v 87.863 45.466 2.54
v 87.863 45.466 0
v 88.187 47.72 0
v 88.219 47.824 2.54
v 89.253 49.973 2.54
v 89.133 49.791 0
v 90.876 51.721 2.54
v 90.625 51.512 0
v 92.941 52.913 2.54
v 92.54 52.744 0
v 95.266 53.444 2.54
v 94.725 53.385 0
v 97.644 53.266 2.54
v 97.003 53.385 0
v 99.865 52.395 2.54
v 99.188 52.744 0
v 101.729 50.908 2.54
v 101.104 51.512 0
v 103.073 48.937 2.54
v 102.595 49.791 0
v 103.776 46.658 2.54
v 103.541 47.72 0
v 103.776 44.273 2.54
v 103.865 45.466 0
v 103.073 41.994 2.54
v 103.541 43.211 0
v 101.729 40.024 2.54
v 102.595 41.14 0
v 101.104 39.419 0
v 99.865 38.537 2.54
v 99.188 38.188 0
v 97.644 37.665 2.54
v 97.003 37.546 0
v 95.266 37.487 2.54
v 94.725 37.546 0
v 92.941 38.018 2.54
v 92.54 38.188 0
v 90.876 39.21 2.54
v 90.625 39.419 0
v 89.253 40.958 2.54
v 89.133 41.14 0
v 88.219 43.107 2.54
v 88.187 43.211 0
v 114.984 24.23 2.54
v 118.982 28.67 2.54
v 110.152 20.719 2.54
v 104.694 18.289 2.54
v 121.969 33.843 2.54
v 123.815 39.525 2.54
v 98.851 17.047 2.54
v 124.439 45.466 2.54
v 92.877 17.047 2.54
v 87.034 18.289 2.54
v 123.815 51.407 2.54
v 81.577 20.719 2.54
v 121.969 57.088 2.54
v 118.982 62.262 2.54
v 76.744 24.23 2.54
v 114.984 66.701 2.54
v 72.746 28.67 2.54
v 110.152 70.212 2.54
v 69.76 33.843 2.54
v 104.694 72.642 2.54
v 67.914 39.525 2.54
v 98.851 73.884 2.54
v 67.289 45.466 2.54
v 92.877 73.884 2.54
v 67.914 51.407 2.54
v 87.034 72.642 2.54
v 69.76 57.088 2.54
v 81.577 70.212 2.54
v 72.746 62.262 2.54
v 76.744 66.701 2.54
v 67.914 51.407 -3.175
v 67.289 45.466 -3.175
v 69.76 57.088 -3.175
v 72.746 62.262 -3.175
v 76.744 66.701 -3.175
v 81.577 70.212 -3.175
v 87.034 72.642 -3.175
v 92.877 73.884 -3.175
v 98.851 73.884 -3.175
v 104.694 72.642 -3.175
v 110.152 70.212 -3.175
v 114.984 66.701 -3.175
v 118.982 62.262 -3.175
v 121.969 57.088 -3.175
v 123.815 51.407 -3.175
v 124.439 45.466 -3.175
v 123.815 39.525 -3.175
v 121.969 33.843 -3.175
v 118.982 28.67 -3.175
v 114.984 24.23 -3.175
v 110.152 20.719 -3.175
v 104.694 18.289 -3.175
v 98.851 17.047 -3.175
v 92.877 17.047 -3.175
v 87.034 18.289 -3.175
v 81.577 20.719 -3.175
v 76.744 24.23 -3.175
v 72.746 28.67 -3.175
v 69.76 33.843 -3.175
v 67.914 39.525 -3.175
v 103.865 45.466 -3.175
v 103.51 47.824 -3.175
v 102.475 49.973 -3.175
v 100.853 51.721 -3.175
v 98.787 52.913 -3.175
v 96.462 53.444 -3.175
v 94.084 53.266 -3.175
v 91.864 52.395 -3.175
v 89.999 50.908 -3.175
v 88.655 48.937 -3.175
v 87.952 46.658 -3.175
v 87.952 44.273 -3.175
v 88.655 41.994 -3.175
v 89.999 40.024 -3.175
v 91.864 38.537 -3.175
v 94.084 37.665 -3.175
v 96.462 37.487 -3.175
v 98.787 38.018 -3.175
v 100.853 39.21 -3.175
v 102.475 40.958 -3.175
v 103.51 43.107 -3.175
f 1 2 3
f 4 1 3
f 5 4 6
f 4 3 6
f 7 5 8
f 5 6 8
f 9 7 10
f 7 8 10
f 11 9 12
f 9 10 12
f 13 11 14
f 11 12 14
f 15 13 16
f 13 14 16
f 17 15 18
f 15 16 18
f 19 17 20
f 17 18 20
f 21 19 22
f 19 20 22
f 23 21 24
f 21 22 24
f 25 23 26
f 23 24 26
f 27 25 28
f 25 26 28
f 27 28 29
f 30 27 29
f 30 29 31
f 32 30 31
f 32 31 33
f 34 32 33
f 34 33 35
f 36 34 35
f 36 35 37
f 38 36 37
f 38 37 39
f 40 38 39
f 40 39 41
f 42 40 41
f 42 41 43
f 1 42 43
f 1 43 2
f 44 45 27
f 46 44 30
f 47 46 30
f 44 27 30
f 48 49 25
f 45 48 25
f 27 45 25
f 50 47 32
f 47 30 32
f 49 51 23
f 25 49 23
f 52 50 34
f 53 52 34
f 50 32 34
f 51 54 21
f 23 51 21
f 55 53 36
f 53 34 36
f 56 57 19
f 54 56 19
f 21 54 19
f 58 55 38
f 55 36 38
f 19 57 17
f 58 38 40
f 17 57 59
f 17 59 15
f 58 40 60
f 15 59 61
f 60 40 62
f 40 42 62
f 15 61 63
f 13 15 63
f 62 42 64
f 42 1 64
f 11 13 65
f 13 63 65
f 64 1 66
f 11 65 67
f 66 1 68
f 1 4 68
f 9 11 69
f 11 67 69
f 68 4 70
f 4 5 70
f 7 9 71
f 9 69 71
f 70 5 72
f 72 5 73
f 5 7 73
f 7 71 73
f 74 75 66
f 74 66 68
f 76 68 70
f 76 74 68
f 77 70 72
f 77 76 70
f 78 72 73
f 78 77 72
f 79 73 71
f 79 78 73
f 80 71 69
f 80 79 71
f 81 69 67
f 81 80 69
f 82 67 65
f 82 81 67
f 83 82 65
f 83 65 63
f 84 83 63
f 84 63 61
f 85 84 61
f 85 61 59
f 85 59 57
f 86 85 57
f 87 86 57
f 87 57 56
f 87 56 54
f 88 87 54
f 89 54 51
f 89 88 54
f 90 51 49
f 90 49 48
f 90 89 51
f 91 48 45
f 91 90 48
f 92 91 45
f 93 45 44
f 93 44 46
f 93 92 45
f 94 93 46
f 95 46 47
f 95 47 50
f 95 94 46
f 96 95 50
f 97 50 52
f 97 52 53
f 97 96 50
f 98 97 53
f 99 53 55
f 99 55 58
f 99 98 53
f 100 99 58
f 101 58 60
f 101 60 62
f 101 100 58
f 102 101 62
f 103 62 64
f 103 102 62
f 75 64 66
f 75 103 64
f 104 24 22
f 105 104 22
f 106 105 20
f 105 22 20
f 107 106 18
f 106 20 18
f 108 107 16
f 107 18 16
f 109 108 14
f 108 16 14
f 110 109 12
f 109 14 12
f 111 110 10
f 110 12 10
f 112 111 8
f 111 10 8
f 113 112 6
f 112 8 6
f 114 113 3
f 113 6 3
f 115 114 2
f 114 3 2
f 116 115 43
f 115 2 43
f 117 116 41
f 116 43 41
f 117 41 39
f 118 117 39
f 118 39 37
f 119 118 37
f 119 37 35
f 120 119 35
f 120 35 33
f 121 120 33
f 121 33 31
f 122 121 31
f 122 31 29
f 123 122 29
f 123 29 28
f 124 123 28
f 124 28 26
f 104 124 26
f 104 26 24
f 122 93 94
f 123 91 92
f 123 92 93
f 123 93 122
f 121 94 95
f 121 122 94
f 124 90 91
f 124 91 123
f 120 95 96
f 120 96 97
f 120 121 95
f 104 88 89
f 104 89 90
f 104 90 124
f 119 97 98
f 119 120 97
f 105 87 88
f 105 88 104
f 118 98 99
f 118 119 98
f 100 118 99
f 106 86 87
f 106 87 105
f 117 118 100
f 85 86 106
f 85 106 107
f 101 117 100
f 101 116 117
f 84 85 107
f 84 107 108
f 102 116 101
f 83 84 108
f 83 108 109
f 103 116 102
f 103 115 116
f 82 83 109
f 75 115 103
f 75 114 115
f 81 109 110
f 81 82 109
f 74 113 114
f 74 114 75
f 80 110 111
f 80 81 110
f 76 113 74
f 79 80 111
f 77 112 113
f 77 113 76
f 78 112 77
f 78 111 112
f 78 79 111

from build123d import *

# Parameters (mm, degrees)
SKETCH1_R               = 19.05
SKETCH1_R_2             = 8.001
BOSS_EXTRUDE1_DEPTH     = 3.175
SKETCH2_R               = 19.05
BOSS_EXTRUDE2_DEPTH     = 4.7625
F_3_8_CLEARANCE_HOLE1_D = 10.31748
SKETCH6_R               = 8.001
CUT_EXTRUDE1_DEPTH      = 2.54
SKETCH7_R               = 19.05
CUT_EXTRUDE2_DEPTH      = 2.2225
SKETCH8_R               = 28.575
SKETCH8_R_2             = 19.05
BOSS_EXTRUDE3_DEPTH     = 5.715


with BuildPart() as part:
    # Sketch1 → Boss-Extrude1 (new body)
    with BuildSketch(Plane.XY):
        with Locations((95.864074702, 45.465579041)):
            Circle(SKETCH1_R)
        with Locations((95.864074702, 45.465579041)):
            Circle(SKETCH1_R_2, mode=Mode.SUBTRACT)
    extrude(amount=-BOSS_EXTRUDE1_DEPTH)

    # Sketch2 → Boss-Extrude2 (add)
    with BuildSketch(Plane.XY):
        with Locations((95.864074702, 45.465579041)):
            Circle(SKETCH2_R)
    extrude(amount=BOSS_EXTRUDE2_DEPTH)

    # 3/8 Clearance Hole1 (through all)
    with Locations(Plane.XY.offset(4.7625)):
        with Locations((95.864074702, 45.465579041)):
            Hole(F_3_8_CLEARANCE_HOLE1_D / 2)

    # Sketch6 → Cut-Extrude1 (cut)
    with BuildSketch(Plane(origin=(0, 0, 0), x_dir=(-1, 0, 0), z_dir=(0, 0, -1))):
        with Locations((-95.864074702, 45.465579041)):
            Circle(SKETCH6_R)
    extrude(amount=-CUT_EXTRUDE1_DEPTH, mode=Mode.SUBTRACT)

    # Sketch7 → Cut-Extrude2 (cut)
    with BuildSketch(Plane.XY.offset(4.7625)):
        with Locations((95.864074702, 45.465579041)):
            Circle(SKETCH7_R)
    extrude(amount=-CUT_EXTRUDE2_DEPTH, mode=Mode.SUBTRACT)

    # Sketch8 → Boss-Extrude3 (add)
    with BuildSketch(Plane(origin=(0, 0, -3.175), x_dir=(-1, 0, 0), z_dir=(0, 0, -1))):
        with Locations((-95.864074702, 45.465579041)):
            Circle(SKETCH8_R)
        with Locations((-95.864074702, 45.465579041)):
            Circle(SKETCH8_R_2, mode=Mode.SUBTRACT)
    extrude(amount=-BOSS_EXTRUDE3_DEPTH)


solid = part.part
